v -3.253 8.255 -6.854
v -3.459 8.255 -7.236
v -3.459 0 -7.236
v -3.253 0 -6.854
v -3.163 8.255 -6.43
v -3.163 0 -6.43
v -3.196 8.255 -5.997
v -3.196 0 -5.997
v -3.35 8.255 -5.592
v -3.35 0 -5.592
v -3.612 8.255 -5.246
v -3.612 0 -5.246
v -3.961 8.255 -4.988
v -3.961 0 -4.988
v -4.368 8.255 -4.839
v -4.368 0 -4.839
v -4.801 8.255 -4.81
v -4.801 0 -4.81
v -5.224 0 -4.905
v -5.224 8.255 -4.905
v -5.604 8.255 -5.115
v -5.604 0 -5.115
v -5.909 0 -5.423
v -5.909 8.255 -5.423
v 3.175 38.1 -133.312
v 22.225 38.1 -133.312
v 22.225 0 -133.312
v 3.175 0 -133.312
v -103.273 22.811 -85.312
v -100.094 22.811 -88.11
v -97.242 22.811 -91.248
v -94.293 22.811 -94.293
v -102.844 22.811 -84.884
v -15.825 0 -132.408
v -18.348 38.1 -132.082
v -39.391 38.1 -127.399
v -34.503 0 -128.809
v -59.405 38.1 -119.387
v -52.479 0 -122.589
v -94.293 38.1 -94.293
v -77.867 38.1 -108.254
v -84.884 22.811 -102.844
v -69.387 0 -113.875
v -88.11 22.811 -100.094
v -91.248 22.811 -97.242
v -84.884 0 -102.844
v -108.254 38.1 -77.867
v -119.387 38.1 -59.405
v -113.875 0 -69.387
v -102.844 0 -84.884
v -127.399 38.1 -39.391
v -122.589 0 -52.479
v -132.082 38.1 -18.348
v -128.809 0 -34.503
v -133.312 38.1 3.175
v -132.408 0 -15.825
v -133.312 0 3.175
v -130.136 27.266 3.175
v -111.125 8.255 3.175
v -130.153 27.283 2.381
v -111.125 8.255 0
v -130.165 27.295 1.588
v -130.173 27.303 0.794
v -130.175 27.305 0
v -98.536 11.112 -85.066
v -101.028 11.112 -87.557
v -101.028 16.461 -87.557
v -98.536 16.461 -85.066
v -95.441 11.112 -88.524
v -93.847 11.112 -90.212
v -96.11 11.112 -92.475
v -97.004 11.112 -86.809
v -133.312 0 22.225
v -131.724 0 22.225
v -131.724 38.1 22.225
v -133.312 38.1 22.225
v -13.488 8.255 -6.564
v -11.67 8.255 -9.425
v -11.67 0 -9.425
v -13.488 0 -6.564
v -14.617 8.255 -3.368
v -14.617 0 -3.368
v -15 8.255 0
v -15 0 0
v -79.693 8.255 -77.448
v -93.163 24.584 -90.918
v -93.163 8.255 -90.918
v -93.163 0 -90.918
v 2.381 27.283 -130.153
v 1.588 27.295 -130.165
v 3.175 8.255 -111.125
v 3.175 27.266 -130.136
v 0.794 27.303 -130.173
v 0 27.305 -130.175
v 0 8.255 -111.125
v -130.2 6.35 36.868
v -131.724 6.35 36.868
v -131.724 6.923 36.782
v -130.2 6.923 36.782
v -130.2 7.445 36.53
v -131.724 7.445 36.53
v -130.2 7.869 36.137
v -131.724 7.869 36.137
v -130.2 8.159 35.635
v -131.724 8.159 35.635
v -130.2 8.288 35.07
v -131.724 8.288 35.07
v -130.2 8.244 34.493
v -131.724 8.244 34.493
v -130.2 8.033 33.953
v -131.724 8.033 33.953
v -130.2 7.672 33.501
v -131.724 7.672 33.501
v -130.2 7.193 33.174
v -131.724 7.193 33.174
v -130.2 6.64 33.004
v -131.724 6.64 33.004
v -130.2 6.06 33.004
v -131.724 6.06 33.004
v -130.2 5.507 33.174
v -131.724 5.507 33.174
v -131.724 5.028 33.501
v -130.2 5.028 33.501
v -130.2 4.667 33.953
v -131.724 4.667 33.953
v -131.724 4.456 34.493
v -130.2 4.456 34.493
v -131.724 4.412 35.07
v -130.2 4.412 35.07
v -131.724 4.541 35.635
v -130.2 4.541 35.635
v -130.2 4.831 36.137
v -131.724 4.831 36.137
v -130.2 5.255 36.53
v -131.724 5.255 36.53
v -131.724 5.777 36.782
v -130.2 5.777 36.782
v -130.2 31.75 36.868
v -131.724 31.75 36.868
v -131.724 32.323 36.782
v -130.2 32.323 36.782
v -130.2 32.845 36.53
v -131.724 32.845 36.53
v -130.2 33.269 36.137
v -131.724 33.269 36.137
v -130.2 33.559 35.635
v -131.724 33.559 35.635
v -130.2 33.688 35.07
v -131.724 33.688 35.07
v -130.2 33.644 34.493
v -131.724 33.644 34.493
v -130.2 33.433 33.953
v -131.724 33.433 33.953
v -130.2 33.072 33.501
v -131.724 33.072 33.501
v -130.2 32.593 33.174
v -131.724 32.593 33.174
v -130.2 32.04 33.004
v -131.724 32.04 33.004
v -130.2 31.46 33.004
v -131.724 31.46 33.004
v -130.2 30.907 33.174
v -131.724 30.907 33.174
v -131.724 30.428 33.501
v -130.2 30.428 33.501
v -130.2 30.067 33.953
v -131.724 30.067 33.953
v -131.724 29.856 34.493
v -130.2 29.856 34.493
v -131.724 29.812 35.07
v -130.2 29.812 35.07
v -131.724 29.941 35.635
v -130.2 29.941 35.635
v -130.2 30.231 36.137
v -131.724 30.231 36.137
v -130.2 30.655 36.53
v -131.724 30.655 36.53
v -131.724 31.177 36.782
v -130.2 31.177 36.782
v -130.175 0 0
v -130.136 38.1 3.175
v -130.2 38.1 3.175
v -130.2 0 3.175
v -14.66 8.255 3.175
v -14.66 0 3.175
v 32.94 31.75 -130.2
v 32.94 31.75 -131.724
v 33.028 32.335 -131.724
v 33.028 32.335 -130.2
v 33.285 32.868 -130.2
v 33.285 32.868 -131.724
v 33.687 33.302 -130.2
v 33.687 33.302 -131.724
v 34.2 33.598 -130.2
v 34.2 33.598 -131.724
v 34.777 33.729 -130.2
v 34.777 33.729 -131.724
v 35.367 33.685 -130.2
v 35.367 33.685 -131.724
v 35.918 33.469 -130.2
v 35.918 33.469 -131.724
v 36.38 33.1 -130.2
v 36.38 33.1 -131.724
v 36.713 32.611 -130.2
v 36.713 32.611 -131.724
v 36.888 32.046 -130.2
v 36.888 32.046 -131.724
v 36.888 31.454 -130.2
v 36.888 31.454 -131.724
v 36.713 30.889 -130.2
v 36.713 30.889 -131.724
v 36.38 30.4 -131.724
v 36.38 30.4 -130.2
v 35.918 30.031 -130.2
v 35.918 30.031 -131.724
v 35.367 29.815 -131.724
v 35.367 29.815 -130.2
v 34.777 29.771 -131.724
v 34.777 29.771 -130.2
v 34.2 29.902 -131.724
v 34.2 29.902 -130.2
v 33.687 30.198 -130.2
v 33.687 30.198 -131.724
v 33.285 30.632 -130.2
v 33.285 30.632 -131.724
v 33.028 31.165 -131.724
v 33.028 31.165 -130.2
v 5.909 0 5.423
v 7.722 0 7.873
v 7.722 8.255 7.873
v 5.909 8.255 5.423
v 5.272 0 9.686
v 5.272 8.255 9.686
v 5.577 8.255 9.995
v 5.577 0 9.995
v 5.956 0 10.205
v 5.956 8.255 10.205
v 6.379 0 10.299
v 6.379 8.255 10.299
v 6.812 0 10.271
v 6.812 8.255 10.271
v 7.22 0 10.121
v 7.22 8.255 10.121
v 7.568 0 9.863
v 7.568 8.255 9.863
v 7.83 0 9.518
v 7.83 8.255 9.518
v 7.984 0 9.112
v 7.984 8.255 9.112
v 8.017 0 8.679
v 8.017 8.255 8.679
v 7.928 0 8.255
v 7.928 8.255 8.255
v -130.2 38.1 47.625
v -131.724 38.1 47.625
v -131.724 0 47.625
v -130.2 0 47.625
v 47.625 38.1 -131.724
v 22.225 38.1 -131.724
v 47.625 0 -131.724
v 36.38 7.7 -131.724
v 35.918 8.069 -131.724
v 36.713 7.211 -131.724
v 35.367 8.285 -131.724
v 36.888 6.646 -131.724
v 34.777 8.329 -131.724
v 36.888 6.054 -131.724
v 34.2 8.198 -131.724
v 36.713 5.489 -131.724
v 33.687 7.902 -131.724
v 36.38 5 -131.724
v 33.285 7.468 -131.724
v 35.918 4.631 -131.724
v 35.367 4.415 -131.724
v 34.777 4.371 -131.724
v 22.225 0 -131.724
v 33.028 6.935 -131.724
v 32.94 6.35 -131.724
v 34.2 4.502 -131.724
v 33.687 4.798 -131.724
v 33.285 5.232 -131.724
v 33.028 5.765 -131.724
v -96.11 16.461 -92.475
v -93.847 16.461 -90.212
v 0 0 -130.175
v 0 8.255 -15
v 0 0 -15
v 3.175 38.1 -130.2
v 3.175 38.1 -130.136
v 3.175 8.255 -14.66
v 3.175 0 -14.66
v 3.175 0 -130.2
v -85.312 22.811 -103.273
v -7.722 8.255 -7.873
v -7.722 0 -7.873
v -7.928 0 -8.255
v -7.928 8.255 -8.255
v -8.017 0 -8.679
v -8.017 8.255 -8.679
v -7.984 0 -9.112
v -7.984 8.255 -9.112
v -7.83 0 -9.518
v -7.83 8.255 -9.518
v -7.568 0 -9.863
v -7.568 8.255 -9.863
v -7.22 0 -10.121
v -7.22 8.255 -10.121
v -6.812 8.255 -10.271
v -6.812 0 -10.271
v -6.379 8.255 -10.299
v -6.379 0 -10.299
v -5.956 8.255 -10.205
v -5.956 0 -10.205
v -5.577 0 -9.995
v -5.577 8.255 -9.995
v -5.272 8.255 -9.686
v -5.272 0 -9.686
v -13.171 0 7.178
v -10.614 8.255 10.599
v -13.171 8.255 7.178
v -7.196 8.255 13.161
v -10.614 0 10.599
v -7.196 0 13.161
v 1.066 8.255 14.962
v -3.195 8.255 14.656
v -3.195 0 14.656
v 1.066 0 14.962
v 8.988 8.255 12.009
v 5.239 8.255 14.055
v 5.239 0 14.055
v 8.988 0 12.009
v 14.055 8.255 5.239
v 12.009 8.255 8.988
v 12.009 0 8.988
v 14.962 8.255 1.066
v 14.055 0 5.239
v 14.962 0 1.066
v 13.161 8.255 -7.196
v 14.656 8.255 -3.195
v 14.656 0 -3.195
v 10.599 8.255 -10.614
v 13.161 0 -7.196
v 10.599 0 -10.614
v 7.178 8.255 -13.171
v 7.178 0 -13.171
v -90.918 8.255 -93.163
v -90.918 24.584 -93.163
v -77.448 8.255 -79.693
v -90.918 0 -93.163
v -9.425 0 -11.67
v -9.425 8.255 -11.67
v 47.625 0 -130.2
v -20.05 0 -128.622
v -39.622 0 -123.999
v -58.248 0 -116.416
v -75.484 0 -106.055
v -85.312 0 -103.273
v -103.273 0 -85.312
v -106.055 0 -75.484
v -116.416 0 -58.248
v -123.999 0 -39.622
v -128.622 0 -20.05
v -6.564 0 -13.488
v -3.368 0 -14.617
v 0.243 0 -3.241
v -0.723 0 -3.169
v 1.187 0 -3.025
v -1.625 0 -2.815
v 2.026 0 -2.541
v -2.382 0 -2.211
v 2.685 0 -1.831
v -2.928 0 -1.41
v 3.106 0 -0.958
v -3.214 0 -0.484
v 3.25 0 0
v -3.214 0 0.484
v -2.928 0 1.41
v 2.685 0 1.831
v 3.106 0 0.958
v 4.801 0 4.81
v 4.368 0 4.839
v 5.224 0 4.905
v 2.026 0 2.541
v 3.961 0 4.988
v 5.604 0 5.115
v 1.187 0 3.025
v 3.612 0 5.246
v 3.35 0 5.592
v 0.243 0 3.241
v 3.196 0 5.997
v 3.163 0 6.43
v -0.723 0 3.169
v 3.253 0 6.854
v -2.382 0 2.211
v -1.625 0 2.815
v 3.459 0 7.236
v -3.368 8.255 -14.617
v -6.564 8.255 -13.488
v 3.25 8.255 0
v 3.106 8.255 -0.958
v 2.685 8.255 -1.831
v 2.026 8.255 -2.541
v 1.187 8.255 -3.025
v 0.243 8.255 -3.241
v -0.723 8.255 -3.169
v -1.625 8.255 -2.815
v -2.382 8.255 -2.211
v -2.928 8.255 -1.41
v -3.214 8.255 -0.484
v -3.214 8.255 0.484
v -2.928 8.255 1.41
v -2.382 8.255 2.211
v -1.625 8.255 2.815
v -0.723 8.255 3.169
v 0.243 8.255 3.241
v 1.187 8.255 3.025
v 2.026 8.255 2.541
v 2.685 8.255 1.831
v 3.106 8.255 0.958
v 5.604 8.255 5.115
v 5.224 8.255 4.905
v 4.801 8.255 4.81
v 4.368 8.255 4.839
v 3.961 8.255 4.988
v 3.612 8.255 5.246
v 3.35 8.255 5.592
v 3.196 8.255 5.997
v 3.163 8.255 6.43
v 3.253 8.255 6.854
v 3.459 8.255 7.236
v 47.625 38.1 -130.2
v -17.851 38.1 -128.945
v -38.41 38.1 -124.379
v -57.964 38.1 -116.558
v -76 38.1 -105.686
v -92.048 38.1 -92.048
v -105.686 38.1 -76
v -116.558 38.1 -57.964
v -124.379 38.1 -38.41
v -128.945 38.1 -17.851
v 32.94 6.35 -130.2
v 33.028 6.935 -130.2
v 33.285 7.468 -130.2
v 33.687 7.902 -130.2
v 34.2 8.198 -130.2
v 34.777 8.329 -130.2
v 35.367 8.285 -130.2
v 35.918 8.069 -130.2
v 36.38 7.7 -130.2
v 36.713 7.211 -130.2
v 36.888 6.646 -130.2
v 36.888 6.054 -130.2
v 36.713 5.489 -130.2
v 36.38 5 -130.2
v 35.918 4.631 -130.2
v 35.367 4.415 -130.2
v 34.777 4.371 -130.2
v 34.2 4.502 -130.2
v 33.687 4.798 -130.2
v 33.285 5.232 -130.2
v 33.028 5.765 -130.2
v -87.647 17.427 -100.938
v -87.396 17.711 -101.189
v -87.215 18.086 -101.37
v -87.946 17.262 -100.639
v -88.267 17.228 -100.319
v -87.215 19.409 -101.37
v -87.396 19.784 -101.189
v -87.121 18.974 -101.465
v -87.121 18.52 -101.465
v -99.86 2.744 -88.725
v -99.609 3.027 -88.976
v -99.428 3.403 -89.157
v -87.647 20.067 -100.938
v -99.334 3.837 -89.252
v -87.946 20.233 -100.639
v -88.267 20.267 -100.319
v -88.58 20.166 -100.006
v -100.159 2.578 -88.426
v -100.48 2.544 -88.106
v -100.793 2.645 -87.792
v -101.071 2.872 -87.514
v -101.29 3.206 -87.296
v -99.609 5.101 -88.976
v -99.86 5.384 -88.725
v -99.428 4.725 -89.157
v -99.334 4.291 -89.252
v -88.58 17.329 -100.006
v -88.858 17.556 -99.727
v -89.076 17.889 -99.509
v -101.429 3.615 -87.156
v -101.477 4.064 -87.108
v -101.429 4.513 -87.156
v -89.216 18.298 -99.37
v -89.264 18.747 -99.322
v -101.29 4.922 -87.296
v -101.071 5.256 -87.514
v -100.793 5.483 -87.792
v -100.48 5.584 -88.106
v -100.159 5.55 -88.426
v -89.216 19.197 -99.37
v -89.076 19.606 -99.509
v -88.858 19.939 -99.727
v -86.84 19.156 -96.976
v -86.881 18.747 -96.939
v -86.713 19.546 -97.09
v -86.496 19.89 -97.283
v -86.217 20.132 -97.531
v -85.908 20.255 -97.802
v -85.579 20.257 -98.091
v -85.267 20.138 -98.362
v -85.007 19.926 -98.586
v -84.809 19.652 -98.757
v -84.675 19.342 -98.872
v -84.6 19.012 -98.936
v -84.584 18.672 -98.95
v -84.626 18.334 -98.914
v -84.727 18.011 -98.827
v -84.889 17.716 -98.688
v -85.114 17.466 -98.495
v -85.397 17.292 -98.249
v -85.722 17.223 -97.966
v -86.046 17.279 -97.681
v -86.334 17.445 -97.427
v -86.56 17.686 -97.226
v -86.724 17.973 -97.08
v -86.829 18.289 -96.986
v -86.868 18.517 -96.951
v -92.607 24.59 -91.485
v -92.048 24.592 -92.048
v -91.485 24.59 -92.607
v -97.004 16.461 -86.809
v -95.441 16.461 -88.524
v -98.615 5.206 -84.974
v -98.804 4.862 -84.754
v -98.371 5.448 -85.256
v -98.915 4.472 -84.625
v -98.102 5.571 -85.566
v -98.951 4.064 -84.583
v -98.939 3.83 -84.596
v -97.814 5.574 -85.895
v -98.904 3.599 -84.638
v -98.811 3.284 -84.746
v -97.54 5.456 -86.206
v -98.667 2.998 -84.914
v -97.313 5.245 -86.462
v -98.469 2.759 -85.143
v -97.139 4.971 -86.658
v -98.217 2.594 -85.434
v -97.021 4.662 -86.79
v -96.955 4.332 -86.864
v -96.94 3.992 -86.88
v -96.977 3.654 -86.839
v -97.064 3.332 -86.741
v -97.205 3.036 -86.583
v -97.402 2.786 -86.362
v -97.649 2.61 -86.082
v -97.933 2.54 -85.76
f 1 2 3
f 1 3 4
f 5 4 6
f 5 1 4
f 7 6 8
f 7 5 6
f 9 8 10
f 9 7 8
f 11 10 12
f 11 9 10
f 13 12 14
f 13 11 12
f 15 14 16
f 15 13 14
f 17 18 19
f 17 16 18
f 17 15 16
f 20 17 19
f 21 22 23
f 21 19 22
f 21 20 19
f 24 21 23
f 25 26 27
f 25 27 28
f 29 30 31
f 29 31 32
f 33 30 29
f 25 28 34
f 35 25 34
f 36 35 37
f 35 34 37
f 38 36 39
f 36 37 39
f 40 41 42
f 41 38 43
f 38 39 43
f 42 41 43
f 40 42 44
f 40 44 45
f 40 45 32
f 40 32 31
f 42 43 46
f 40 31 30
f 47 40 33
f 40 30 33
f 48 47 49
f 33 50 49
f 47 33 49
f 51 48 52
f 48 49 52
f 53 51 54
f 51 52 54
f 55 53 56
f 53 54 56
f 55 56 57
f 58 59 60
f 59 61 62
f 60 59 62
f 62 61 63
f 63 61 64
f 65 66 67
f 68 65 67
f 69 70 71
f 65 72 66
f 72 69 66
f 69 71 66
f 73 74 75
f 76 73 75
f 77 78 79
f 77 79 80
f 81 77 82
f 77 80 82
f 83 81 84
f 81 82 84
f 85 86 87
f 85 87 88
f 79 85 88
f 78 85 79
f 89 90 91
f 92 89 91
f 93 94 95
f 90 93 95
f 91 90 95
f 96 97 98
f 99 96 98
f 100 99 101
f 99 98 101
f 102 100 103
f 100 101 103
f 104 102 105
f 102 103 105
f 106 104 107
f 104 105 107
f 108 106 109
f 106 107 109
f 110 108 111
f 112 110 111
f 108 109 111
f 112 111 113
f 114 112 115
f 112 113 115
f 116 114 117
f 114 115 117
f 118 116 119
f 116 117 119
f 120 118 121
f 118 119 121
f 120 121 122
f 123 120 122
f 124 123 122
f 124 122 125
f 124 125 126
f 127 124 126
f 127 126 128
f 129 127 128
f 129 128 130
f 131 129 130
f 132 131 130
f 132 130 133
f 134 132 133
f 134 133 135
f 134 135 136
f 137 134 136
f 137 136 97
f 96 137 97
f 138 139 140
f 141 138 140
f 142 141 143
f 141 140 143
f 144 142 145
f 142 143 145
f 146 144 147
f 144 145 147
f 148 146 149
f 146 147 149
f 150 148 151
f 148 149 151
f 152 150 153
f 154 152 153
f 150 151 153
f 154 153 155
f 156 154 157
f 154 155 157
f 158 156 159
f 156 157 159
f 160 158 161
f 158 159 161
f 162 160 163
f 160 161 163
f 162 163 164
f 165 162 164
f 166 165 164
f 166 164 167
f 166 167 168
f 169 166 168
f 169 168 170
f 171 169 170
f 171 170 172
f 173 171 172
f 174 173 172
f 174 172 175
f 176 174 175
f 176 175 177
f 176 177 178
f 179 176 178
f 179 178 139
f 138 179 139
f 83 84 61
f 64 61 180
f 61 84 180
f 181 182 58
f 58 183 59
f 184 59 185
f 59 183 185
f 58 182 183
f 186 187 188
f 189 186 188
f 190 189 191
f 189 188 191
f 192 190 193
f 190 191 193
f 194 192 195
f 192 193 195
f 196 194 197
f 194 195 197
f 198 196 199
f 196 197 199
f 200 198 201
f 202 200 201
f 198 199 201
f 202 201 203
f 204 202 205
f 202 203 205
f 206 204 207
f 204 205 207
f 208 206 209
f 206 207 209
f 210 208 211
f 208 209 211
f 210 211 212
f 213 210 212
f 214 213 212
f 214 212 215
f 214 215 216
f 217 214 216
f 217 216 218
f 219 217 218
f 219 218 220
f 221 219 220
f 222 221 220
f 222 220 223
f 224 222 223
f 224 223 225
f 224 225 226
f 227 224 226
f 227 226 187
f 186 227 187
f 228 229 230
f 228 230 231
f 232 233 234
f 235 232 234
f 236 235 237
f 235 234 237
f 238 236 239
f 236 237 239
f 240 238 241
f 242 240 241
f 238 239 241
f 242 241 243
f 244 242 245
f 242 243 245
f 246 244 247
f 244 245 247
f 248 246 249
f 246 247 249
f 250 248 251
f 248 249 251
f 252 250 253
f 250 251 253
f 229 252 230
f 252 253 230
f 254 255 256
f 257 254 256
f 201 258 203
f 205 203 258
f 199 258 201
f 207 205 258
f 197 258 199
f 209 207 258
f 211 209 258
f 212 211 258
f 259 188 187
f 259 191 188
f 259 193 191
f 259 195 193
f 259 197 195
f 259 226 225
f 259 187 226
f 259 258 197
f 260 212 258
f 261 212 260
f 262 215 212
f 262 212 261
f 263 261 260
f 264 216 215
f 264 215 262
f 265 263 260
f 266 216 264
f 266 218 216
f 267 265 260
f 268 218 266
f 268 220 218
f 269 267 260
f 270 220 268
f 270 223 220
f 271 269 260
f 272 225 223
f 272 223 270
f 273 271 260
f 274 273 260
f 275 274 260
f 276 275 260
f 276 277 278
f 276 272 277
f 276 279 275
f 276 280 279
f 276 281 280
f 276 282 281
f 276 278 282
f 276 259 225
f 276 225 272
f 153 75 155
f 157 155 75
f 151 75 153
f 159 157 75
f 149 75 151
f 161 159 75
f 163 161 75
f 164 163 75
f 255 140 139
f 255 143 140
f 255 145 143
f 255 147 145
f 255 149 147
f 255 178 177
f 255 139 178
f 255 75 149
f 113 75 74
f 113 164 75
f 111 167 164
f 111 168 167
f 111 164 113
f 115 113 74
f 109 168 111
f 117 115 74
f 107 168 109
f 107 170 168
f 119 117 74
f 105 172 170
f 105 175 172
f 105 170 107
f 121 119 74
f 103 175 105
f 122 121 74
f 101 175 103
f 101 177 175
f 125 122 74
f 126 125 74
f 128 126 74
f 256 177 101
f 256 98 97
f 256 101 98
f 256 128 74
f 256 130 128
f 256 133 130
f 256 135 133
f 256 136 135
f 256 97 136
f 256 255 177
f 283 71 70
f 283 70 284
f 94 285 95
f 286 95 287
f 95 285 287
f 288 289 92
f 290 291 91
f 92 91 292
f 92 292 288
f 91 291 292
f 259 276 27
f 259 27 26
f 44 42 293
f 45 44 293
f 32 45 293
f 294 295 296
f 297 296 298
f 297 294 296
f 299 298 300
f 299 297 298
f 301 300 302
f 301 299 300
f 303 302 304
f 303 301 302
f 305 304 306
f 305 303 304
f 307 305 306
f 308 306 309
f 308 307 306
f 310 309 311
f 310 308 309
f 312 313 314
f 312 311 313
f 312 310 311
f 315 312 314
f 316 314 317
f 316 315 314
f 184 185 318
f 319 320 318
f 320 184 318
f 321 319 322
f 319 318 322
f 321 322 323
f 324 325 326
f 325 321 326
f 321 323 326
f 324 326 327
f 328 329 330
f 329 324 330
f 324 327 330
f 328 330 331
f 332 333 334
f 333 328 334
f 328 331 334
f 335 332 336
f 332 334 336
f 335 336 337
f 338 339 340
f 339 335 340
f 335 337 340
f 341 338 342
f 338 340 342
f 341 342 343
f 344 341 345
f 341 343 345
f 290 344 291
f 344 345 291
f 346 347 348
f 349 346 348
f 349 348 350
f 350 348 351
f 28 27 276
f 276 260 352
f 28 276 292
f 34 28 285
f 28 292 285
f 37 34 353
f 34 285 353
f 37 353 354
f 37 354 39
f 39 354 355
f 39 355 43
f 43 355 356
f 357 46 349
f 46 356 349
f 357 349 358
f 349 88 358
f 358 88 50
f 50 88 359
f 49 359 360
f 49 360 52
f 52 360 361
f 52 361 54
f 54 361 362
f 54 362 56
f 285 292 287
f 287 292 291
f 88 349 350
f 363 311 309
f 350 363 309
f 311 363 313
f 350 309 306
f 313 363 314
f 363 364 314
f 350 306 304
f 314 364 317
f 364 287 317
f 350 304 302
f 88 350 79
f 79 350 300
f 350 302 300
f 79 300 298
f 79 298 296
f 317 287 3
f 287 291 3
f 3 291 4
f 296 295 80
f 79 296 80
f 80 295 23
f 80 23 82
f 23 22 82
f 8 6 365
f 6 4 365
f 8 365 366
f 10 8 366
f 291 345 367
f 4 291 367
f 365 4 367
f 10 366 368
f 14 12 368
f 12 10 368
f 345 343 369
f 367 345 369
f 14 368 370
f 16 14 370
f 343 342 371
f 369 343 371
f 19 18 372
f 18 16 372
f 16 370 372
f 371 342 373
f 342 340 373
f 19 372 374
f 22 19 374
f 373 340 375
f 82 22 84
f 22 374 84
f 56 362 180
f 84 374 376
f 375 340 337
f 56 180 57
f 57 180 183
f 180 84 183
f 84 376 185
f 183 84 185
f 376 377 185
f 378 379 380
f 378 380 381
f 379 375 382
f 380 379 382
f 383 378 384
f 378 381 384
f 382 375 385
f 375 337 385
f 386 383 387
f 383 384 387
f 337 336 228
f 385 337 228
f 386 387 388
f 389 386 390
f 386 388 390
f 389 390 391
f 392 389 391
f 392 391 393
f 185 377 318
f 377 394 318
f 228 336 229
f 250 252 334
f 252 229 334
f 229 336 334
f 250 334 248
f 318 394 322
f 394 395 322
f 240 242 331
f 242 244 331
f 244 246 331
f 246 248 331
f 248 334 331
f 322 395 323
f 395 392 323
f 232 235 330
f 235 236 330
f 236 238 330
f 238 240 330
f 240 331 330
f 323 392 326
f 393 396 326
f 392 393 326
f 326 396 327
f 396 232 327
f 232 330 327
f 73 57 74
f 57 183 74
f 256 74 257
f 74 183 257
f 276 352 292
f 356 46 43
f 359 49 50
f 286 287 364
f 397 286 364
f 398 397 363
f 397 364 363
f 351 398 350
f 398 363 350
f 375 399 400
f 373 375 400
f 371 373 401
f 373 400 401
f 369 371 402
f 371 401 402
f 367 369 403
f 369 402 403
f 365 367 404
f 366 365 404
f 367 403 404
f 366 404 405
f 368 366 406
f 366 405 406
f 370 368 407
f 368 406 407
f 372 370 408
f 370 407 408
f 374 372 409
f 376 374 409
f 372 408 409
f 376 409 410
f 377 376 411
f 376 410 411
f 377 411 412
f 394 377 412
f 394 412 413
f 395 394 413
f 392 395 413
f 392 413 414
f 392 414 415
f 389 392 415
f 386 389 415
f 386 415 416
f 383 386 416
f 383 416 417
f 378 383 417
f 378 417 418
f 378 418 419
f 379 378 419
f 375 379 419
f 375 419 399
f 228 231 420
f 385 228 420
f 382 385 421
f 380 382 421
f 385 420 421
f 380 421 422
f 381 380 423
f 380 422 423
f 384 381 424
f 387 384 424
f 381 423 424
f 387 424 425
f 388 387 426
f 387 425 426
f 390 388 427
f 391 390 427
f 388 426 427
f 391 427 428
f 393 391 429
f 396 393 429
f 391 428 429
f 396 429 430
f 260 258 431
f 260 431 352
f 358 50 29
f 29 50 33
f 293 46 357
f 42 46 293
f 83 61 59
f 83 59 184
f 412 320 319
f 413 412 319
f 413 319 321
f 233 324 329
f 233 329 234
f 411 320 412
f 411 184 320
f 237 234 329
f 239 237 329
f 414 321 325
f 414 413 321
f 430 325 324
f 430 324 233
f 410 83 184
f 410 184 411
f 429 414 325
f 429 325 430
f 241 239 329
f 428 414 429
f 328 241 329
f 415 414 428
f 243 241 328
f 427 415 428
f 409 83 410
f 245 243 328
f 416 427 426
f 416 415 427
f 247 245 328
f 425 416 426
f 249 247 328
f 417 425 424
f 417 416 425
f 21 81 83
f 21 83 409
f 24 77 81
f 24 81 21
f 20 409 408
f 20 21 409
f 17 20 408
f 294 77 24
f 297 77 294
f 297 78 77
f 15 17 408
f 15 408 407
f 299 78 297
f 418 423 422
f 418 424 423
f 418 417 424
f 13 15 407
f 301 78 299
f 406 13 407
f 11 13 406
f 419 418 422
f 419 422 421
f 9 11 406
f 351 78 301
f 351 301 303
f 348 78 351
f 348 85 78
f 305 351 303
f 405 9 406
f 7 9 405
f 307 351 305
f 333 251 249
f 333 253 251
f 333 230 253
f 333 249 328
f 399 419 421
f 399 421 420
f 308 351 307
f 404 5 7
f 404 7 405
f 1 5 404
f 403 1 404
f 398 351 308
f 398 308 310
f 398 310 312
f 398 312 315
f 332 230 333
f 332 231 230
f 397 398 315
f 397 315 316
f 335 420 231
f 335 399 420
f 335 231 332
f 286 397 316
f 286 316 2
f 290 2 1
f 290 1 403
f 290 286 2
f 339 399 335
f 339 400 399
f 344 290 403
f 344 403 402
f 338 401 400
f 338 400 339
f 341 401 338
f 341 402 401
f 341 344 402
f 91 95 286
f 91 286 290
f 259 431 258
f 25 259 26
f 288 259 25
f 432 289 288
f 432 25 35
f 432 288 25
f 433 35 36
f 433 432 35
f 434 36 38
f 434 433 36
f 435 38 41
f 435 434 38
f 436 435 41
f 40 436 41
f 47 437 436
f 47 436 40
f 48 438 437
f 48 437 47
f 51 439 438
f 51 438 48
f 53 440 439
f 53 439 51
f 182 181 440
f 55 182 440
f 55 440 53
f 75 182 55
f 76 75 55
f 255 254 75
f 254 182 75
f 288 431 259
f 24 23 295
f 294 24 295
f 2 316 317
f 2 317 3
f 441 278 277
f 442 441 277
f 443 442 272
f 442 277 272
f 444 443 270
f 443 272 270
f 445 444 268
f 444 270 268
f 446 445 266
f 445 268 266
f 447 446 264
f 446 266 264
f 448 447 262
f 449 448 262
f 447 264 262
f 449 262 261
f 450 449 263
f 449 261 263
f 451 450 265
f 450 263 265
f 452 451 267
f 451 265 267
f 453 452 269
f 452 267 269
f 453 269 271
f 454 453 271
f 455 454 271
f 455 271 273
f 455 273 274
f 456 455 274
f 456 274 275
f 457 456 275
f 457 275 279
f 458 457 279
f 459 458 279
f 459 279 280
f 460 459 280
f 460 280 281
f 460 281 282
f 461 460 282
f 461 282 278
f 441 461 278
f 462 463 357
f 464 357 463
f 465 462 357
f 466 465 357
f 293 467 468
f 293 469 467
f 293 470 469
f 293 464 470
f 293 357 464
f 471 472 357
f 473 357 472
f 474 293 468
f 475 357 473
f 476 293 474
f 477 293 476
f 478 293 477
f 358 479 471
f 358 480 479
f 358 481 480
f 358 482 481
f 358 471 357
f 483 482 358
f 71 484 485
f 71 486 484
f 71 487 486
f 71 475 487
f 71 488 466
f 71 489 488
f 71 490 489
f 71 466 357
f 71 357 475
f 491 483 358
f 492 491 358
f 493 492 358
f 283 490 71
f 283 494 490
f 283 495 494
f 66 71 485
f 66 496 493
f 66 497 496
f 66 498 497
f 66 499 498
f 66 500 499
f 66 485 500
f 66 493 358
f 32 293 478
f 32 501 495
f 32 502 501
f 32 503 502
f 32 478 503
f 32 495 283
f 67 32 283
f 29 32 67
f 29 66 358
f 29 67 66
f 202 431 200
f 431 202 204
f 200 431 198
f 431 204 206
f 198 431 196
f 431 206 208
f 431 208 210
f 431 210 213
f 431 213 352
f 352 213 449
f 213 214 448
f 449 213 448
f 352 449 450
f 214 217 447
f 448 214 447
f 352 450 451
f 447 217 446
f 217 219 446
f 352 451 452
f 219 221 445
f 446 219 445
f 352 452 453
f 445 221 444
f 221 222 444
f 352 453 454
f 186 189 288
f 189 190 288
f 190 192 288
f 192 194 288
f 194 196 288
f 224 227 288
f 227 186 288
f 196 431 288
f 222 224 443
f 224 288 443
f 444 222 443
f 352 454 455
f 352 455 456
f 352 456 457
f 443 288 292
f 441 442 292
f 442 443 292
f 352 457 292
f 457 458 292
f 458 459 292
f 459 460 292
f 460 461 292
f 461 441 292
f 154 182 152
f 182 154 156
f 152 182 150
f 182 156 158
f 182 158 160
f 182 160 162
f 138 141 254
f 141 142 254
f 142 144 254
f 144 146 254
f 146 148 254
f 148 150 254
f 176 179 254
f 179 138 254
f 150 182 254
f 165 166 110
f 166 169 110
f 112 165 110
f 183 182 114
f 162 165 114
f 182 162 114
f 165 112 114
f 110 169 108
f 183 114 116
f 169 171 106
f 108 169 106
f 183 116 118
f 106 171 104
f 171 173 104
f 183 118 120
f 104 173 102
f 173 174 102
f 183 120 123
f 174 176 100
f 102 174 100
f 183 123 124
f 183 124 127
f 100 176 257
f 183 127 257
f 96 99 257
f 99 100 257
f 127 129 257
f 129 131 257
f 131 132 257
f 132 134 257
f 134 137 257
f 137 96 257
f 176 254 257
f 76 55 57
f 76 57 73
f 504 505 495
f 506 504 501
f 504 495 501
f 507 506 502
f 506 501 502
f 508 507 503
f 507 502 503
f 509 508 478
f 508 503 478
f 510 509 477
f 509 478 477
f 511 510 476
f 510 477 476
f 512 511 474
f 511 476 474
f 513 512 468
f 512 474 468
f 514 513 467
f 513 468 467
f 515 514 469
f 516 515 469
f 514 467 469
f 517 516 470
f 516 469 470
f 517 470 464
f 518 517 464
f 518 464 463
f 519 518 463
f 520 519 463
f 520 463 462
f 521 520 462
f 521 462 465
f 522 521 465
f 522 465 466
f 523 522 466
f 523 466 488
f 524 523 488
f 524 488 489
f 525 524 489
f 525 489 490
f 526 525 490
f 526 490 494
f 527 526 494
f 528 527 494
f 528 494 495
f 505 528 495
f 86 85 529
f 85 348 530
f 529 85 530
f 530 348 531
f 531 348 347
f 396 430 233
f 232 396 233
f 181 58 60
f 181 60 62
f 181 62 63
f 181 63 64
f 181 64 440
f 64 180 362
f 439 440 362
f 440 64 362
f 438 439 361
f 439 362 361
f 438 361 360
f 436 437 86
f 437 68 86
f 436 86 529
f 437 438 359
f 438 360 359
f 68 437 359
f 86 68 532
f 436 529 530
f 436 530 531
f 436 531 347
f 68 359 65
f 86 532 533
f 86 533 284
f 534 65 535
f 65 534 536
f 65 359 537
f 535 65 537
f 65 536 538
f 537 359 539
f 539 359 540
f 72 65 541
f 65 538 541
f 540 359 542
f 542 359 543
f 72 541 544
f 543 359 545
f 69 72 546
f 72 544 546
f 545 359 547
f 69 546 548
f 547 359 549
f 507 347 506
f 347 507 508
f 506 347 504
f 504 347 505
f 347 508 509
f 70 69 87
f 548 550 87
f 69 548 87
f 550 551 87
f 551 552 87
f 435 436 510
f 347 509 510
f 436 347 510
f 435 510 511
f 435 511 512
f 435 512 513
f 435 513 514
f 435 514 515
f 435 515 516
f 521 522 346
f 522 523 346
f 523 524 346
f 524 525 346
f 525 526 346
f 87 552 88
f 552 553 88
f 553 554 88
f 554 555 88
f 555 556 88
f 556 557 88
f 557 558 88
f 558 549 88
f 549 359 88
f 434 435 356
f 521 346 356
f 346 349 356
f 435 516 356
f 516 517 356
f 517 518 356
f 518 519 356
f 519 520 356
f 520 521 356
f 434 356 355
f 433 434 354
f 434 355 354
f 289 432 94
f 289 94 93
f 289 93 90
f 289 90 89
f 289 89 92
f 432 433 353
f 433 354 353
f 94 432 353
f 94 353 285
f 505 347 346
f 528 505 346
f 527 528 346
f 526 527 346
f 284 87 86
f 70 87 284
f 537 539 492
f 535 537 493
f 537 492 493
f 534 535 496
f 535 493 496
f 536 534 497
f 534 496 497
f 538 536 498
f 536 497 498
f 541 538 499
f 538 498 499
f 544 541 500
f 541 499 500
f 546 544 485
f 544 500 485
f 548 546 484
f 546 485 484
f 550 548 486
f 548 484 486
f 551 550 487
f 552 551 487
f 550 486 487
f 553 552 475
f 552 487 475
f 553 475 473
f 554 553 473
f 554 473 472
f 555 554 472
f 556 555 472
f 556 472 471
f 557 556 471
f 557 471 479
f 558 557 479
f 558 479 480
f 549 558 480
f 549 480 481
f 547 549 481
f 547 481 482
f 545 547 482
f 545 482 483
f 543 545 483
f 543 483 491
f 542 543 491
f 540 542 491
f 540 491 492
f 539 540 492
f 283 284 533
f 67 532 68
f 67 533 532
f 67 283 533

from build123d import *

# Parameters (mm, degrees)
SKETCH1_R            = 15
BOSS_EXTRUDE2_DEPTH  = 8.255
BOSS_EXTRUDE3_DEPTH  = 8.255
BOSS_EXTRUDE4_DEPTH  = 38.1
SKETCH5_R            = 3.249999977
CUT_EXTRUDE3_DEPTH   = 63.5
BOSS_EXTRUDE13_DEPTH = 3.175
BOSS_EXTRUDE14_DEPTH = 3.175
BOSS_EXTRUDE15_DEPTH = 3.175
CUT_EXTRUDE6_DEPTH   = 9.255
SKETCH20_W           = 38.1
SKETCH20_H           = 44.45
BOSS_EXTRUDE16_DEPTH = 1.524
SKETCH21_W           = 38.1
SKETCH21_H           = 44.45
BOSS_EXTRUDE17_DEPTH = 1.524
SKETCH23_R           = 1.9431
CUT_EXTRUDE7_DEPTH   = 2.54
SKETCH24_R           = 1.98501
CUT_EXTRUDE8_DEPTH   = 2.54
SKETCH25_W           = 19.05
SKETCH25_H           = 38.1
BOSS_EXTRUDE18_DEPTH = 1.587961
SKETCH26_W           = 19.05
SKETCH26_H           = 38.1
BOSS_EXTRUDE19_DEPTH = 1.587961
BOSS_EXTRUDE20_START = -0.60614
SKETCH27_W           = 25.4
SKETCH27_H           = 22.811309973
BOSS_EXTRUDE20_DEPTH = 0.60614
CUT_EXTRUDE9_REACH   = 202.702
SKETCH29_R           = 1.524
CUT_EXTRUDE10_REACH  = 202.702
SKETCH30_W           = 6.954293398
SKETCH30_H           = 5.349239075


with BuildPart() as part:
    # Sketch1 → Boss-Extrude2 (new body)
    with BuildSketch(Plane(origin=(0, 0, 0), x_dir=(1, 0, 0), z_dir=(0, 1, 0))):
        Circle(SKETCH1_R)
    extrude(amount=BOSS_EXTRUDE2_DEPTH)

    # Sketch1<6> → Boss-Extrude3 (add)
    with BuildSketch(Plane(origin=(0, 0, 0), x_dir=(1, 0, 0), z_dir=(0, 1, 0))):
        with BuildLine():
            ThreePointArc((3.175, 130.136274728), (1.587618078, 130.165318322), (0, 130.175))
            Line((0, 130.175), (0, 15))
            ThreePointArc((0, 15), (1.596569562, 14.914790164), (3.175, 14.660128751))
            Line((3.175, 14.660128751), (3.175, 130.136274728))
        make_face()
        with BuildLine():
            Line((-9.42450178, 11.66956581), (-90.918248264, 93.163312294))
            ThreePointArc((-90.918248264, 93.163312294), (-92.047625241, 92.047625241), (-93.163312294, 90.918248264))
            Line((-93.163312294, 90.918248264), (-11.66956581, 9.42450178))
            ThreePointArc((-11.66956581, 9.42450178), (-10.606601718, 10.606601718), (-9.42450178, 11.66956581))
        make_face()
        with BuildLine():
            Line((-15, 0), (-130.175, 0))
            ThreePointArc((-130.175, 0), (-130.165318322, -1.587618078), (-130.136274728, -3.175))
            Line((-130.136274728, -3.175), (-14.660128751, -3.175))
            ThreePointArc((-14.660128751, -3.175), (-14.914790164, -1.596569562), (-15, 0))
        make_face()
    extrude(amount=BOSS_EXTRUDE3_DEPTH)

    # Sketch1<7> → Boss-Extrude4 (add)
    with BuildSketch(Plane(origin=(0, 0, 0), x_dir=(1, 0, 0), z_dir=(0, 1, 0))):
        with BuildLine():
            Line((3.175, 130.136274728), (3.175, 133.312197023))
            ThreePointArc((3.175, 133.312197023), (-94.292689271, 94.292689271), (-133.312197023, -3.175))
            Line((-133.312197023, -3.175), (-130.136274728, -3.175))
            ThreePointArc((-130.136274728, -3.175), (-92.047625241, 92.047625241), (3.175, 130.136274728))
        make_face()
    extrude(amount=BOSS_EXTRUDE4_DEPTH)

    # Sketch5 → Cut-Extrude3 (cut)
    with BuildSketch(Plane(origin=(0, 8.255, 0), x_dir=(1, 0, 0), z_dir=(0, 1, 0))):
        Circle(SKETCH5_R)
    extrude(amount=-CUT_EXTRUDE3_DEPTH, mode=Mode.SUBTRACT)

    # Sketch14 → Boss-Extrude13 (add)
    with BuildSketch(Plane(origin=(0, 0, 0), x_dir=(-1, 0, 0), z_dir=(0, 0, -1))):
        Polygon((130.175, 8.255), (111.125, 8.255), (130.175, 27.305), align=None)
    extrude(amount=-BOSS_EXTRUDE13_DEPTH)

    # Sketch15 → Boss-Extrude14 (add)
    with BuildSketch(Plane.ZY):
        Polygon((-130.175, 8.255), (-130.175, 27.305), (-111.125, 8.255), align=None)
    extrude(amount=-BOSS_EXTRUDE14_DEPTH)

    # Sketch16 → Boss-Extrude15 (add)
    with BuildSketch(Plane(origin=(1.122532015, 0, -1.122532015), x_dir=(-0.707106781, 0, -0.707106781), z_dir=(0.707106781, 0, -0.707106781))):
        Polygon((133.340319762, 8.255), (111.115319762, 8.255), (133.340319762, 27.305), align=None)
    extrude(amount=-BOSS_EXTRUDE15_DEPTH)

    # Sketch17 → Cut-Extrude6 (cut, through all)
    with BuildSketch(Plane(origin=(0, 8.255, 0), x_dir=(1, 0, 0), z_dir=(0, 1, 0))):
        with BuildLine():
            Line((-5.908712478, 5.423058993), (-7.721732332, 7.873214705))
            ThreePointArc((-7.721732332, 7.873214705), (-7.403164404, 10.004802487), (-5.271576621, 9.686234559))
            Line((-5.271576621, 9.686234559), (-3.458556767, 7.236078848))
            ThreePointArc((-3.458556767, 7.236078848), (-3.777124696, 5.104491065), (-5.908712478, 5.423058993))
        make_face()
        with BuildLine():
            Line((3.458556767, -7.236078848), (5.271576621, -9.686234559))
            ThreePointArc((5.271576621, -9.686234559), (7.403164404, -10.004802487), (7.721732332, -7.873214705))
            Line((7.721732332, -7.873214705), (5.908712478, -5.423058993))
            ThreePointArc((5.908712478, -5.423058993), (3.777124696, -5.104491065), (3.458556767, -7.236078848))
        make_face()
    extrude(amount=-CUT_EXTRUDE6_DEPTH, mode=Mode.SUBTRACT)

    # Sketch20 → Boss-Extrude16 (add)
    with BuildSketch(Plane(origin=(0, 0, -131.724235875), x_dir=(0, -1, 0), z_dir=(0, 0, -1))):
        with Locations((-19.05, -25.4)):
            Rectangle(SKETCH20_W, SKETCH20_H)
    extrude(amount=-BOSS_EXTRUDE16_DEPTH)

    # Sketch21 → Boss-Extrude17 (add)
    with BuildSketch(Plane(origin=(-131.724235875, 0, 0), x_dir=(0, -1, 0), z_dir=(-1, 0, 0))):
        with Locations((-19.05, 25.4)):
            Rectangle(SKETCH21_W, SKETCH21_H)
    extrude(amount=-BOSS_EXTRUDE17_DEPTH)

    # Sketch23 → Cut-Extrude7 (cut)
    with BuildSketch(Plane.ZY.offset(131.724235875)):
        with Locations((34.925, 31.75)):
            Circle(SKETCH23_R)
        with Locations((34.925, 6.35)):
            Circle(SKETCH23_R)
    extrude(amount=-CUT_EXTRUDE7_DEPTH, mode=Mode.SUBTRACT)

    # Sketch24 → Cut-Extrude8 (cut)
    with BuildSketch(Plane(origin=(0, 0, -131.724235875), x_dir=(-1, 0, 0), z_dir=(0, 0, -1))):
        with Locations((-34.925, 31.75)):
            Circle(SKETCH24_R)
        with Locations((-34.925, 6.35)):
            Circle(SKETCH24_R)
    extrude(amount=-CUT_EXTRUDE8_DEPTH, mode=Mode.SUBTRACT)

    # Sketch25 → Boss-Extrude18 (add)
    with BuildSketch(Plane.ZY.offset(131.724235875)):
        with Locations((12.7, 19.05)):
            Rectangle(SKETCH25_W, SKETCH25_H)
    extrude(amount=BOSS_EXTRUDE18_DEPTH)

    # Sketch26 → Boss-Extrude19 (add)
    with BuildSketch(Plane(origin=(0, 0, -131.724235875), x_dir=(-1, 0, 0), z_dir=(0, 0, -1))):
        with Locations((-12.7, 19.05)):
            Rectangle(SKETCH26_W, SKETCH26_H)
    extrude(amount=BOSS_EXTRUDE19_DEPTH)

    # Sketch27 → Boss-Extrude20 (add)
    with BuildSketch(Plane(origin=(-94.292689271, 0, -94.292689271), x_dir=(-0.707106781, 0, 0.707106781), z_dir=(-0.707106781, 0, -0.707106781)).offset(BOSS_EXTRUDE20_START)):
        with Locations((0, 11.405654987)):
            Rectangle(SKETCH27_W, SKETCH27_H)
    extrude(amount=BOSS_EXTRUDE20_DEPTH)

    # Sketch29 → Cut-Extrude9 (cut, up to next)
    with BuildSketch(Plane(origin=(-94.292689271, 0, -94.292689271), x_dir=(-0.707106781, 0, 0.707106781), z_dir=(-0.707106781, 0, -0.707106781)), mode=Mode.PRIVATE) as cut_extrude9_sk1:
        with Locations((8.636, 4.064)):
            Circle(SKETCH29_R)
    cut_extrude9_tool1 = extrude(cut_extrude9_sk1.sketch, amount=-CUT_EXTRUDE9_REACH, mode=Mode.PRIVATE) & part.part
    add(cut_extrude9_tool1.solids().sort_by_distance((-100.399263, 4.064, -88.186115))[0], mode=Mode.SUBTRACT)
    # Sketch29 → Cut-Extrude9 (cut, up to next)
    with BuildSketch(Plane(origin=(-94.292689271, 0, -94.292689271), x_dir=(-0.707106781, 0, 0.707106781), z_dir=(-0.707106781, 0, -0.707106781)), mode=Mode.PRIVATE) as cut_extrude9_sk2:
        with Locations((-8.636, 18.747309973)):
            Circle(SKETCH29_R)
    cut_extrude9_tool2 = extrude(cut_extrude9_sk2.sketch, amount=-CUT_EXTRUDE9_REACH, mode=Mode.PRIVATE) & part.part
    add(cut_extrude9_tool2.solids().sort_by_distance((-88.186115, 18.74731, -100.399263))[0], mode=Mode.SUBTRACT)

    # Sketch30 → Cut-Extrude10 (cut, up to next)
    with BuildSketch(Plane(origin=(-94.292689271, 0, -94.292689271), x_dir=(-0.707106781, 0, 0.707106781), z_dir=(-0.707106781, 0, -0.707106781)), mode=Mode.PRIVATE) as cut_extrude10_sk1:
        with Locations((6.047853301, 13.786690436)):
            Rectangle(SKETCH30_W, SKETCH30_H)
    cut_extrude10_tool1 = extrude(cut_extrude10_sk1.sketch, amount=-CUT_EXTRUDE10_REACH, mode=Mode.PRIVATE) & part.part
    add(cut_extrude10_tool1.solids().sort_by_distance((-98.569167, 13.78669, -90.016211))[0], mode=Mode.SUBTRACT)


solid = part.part
